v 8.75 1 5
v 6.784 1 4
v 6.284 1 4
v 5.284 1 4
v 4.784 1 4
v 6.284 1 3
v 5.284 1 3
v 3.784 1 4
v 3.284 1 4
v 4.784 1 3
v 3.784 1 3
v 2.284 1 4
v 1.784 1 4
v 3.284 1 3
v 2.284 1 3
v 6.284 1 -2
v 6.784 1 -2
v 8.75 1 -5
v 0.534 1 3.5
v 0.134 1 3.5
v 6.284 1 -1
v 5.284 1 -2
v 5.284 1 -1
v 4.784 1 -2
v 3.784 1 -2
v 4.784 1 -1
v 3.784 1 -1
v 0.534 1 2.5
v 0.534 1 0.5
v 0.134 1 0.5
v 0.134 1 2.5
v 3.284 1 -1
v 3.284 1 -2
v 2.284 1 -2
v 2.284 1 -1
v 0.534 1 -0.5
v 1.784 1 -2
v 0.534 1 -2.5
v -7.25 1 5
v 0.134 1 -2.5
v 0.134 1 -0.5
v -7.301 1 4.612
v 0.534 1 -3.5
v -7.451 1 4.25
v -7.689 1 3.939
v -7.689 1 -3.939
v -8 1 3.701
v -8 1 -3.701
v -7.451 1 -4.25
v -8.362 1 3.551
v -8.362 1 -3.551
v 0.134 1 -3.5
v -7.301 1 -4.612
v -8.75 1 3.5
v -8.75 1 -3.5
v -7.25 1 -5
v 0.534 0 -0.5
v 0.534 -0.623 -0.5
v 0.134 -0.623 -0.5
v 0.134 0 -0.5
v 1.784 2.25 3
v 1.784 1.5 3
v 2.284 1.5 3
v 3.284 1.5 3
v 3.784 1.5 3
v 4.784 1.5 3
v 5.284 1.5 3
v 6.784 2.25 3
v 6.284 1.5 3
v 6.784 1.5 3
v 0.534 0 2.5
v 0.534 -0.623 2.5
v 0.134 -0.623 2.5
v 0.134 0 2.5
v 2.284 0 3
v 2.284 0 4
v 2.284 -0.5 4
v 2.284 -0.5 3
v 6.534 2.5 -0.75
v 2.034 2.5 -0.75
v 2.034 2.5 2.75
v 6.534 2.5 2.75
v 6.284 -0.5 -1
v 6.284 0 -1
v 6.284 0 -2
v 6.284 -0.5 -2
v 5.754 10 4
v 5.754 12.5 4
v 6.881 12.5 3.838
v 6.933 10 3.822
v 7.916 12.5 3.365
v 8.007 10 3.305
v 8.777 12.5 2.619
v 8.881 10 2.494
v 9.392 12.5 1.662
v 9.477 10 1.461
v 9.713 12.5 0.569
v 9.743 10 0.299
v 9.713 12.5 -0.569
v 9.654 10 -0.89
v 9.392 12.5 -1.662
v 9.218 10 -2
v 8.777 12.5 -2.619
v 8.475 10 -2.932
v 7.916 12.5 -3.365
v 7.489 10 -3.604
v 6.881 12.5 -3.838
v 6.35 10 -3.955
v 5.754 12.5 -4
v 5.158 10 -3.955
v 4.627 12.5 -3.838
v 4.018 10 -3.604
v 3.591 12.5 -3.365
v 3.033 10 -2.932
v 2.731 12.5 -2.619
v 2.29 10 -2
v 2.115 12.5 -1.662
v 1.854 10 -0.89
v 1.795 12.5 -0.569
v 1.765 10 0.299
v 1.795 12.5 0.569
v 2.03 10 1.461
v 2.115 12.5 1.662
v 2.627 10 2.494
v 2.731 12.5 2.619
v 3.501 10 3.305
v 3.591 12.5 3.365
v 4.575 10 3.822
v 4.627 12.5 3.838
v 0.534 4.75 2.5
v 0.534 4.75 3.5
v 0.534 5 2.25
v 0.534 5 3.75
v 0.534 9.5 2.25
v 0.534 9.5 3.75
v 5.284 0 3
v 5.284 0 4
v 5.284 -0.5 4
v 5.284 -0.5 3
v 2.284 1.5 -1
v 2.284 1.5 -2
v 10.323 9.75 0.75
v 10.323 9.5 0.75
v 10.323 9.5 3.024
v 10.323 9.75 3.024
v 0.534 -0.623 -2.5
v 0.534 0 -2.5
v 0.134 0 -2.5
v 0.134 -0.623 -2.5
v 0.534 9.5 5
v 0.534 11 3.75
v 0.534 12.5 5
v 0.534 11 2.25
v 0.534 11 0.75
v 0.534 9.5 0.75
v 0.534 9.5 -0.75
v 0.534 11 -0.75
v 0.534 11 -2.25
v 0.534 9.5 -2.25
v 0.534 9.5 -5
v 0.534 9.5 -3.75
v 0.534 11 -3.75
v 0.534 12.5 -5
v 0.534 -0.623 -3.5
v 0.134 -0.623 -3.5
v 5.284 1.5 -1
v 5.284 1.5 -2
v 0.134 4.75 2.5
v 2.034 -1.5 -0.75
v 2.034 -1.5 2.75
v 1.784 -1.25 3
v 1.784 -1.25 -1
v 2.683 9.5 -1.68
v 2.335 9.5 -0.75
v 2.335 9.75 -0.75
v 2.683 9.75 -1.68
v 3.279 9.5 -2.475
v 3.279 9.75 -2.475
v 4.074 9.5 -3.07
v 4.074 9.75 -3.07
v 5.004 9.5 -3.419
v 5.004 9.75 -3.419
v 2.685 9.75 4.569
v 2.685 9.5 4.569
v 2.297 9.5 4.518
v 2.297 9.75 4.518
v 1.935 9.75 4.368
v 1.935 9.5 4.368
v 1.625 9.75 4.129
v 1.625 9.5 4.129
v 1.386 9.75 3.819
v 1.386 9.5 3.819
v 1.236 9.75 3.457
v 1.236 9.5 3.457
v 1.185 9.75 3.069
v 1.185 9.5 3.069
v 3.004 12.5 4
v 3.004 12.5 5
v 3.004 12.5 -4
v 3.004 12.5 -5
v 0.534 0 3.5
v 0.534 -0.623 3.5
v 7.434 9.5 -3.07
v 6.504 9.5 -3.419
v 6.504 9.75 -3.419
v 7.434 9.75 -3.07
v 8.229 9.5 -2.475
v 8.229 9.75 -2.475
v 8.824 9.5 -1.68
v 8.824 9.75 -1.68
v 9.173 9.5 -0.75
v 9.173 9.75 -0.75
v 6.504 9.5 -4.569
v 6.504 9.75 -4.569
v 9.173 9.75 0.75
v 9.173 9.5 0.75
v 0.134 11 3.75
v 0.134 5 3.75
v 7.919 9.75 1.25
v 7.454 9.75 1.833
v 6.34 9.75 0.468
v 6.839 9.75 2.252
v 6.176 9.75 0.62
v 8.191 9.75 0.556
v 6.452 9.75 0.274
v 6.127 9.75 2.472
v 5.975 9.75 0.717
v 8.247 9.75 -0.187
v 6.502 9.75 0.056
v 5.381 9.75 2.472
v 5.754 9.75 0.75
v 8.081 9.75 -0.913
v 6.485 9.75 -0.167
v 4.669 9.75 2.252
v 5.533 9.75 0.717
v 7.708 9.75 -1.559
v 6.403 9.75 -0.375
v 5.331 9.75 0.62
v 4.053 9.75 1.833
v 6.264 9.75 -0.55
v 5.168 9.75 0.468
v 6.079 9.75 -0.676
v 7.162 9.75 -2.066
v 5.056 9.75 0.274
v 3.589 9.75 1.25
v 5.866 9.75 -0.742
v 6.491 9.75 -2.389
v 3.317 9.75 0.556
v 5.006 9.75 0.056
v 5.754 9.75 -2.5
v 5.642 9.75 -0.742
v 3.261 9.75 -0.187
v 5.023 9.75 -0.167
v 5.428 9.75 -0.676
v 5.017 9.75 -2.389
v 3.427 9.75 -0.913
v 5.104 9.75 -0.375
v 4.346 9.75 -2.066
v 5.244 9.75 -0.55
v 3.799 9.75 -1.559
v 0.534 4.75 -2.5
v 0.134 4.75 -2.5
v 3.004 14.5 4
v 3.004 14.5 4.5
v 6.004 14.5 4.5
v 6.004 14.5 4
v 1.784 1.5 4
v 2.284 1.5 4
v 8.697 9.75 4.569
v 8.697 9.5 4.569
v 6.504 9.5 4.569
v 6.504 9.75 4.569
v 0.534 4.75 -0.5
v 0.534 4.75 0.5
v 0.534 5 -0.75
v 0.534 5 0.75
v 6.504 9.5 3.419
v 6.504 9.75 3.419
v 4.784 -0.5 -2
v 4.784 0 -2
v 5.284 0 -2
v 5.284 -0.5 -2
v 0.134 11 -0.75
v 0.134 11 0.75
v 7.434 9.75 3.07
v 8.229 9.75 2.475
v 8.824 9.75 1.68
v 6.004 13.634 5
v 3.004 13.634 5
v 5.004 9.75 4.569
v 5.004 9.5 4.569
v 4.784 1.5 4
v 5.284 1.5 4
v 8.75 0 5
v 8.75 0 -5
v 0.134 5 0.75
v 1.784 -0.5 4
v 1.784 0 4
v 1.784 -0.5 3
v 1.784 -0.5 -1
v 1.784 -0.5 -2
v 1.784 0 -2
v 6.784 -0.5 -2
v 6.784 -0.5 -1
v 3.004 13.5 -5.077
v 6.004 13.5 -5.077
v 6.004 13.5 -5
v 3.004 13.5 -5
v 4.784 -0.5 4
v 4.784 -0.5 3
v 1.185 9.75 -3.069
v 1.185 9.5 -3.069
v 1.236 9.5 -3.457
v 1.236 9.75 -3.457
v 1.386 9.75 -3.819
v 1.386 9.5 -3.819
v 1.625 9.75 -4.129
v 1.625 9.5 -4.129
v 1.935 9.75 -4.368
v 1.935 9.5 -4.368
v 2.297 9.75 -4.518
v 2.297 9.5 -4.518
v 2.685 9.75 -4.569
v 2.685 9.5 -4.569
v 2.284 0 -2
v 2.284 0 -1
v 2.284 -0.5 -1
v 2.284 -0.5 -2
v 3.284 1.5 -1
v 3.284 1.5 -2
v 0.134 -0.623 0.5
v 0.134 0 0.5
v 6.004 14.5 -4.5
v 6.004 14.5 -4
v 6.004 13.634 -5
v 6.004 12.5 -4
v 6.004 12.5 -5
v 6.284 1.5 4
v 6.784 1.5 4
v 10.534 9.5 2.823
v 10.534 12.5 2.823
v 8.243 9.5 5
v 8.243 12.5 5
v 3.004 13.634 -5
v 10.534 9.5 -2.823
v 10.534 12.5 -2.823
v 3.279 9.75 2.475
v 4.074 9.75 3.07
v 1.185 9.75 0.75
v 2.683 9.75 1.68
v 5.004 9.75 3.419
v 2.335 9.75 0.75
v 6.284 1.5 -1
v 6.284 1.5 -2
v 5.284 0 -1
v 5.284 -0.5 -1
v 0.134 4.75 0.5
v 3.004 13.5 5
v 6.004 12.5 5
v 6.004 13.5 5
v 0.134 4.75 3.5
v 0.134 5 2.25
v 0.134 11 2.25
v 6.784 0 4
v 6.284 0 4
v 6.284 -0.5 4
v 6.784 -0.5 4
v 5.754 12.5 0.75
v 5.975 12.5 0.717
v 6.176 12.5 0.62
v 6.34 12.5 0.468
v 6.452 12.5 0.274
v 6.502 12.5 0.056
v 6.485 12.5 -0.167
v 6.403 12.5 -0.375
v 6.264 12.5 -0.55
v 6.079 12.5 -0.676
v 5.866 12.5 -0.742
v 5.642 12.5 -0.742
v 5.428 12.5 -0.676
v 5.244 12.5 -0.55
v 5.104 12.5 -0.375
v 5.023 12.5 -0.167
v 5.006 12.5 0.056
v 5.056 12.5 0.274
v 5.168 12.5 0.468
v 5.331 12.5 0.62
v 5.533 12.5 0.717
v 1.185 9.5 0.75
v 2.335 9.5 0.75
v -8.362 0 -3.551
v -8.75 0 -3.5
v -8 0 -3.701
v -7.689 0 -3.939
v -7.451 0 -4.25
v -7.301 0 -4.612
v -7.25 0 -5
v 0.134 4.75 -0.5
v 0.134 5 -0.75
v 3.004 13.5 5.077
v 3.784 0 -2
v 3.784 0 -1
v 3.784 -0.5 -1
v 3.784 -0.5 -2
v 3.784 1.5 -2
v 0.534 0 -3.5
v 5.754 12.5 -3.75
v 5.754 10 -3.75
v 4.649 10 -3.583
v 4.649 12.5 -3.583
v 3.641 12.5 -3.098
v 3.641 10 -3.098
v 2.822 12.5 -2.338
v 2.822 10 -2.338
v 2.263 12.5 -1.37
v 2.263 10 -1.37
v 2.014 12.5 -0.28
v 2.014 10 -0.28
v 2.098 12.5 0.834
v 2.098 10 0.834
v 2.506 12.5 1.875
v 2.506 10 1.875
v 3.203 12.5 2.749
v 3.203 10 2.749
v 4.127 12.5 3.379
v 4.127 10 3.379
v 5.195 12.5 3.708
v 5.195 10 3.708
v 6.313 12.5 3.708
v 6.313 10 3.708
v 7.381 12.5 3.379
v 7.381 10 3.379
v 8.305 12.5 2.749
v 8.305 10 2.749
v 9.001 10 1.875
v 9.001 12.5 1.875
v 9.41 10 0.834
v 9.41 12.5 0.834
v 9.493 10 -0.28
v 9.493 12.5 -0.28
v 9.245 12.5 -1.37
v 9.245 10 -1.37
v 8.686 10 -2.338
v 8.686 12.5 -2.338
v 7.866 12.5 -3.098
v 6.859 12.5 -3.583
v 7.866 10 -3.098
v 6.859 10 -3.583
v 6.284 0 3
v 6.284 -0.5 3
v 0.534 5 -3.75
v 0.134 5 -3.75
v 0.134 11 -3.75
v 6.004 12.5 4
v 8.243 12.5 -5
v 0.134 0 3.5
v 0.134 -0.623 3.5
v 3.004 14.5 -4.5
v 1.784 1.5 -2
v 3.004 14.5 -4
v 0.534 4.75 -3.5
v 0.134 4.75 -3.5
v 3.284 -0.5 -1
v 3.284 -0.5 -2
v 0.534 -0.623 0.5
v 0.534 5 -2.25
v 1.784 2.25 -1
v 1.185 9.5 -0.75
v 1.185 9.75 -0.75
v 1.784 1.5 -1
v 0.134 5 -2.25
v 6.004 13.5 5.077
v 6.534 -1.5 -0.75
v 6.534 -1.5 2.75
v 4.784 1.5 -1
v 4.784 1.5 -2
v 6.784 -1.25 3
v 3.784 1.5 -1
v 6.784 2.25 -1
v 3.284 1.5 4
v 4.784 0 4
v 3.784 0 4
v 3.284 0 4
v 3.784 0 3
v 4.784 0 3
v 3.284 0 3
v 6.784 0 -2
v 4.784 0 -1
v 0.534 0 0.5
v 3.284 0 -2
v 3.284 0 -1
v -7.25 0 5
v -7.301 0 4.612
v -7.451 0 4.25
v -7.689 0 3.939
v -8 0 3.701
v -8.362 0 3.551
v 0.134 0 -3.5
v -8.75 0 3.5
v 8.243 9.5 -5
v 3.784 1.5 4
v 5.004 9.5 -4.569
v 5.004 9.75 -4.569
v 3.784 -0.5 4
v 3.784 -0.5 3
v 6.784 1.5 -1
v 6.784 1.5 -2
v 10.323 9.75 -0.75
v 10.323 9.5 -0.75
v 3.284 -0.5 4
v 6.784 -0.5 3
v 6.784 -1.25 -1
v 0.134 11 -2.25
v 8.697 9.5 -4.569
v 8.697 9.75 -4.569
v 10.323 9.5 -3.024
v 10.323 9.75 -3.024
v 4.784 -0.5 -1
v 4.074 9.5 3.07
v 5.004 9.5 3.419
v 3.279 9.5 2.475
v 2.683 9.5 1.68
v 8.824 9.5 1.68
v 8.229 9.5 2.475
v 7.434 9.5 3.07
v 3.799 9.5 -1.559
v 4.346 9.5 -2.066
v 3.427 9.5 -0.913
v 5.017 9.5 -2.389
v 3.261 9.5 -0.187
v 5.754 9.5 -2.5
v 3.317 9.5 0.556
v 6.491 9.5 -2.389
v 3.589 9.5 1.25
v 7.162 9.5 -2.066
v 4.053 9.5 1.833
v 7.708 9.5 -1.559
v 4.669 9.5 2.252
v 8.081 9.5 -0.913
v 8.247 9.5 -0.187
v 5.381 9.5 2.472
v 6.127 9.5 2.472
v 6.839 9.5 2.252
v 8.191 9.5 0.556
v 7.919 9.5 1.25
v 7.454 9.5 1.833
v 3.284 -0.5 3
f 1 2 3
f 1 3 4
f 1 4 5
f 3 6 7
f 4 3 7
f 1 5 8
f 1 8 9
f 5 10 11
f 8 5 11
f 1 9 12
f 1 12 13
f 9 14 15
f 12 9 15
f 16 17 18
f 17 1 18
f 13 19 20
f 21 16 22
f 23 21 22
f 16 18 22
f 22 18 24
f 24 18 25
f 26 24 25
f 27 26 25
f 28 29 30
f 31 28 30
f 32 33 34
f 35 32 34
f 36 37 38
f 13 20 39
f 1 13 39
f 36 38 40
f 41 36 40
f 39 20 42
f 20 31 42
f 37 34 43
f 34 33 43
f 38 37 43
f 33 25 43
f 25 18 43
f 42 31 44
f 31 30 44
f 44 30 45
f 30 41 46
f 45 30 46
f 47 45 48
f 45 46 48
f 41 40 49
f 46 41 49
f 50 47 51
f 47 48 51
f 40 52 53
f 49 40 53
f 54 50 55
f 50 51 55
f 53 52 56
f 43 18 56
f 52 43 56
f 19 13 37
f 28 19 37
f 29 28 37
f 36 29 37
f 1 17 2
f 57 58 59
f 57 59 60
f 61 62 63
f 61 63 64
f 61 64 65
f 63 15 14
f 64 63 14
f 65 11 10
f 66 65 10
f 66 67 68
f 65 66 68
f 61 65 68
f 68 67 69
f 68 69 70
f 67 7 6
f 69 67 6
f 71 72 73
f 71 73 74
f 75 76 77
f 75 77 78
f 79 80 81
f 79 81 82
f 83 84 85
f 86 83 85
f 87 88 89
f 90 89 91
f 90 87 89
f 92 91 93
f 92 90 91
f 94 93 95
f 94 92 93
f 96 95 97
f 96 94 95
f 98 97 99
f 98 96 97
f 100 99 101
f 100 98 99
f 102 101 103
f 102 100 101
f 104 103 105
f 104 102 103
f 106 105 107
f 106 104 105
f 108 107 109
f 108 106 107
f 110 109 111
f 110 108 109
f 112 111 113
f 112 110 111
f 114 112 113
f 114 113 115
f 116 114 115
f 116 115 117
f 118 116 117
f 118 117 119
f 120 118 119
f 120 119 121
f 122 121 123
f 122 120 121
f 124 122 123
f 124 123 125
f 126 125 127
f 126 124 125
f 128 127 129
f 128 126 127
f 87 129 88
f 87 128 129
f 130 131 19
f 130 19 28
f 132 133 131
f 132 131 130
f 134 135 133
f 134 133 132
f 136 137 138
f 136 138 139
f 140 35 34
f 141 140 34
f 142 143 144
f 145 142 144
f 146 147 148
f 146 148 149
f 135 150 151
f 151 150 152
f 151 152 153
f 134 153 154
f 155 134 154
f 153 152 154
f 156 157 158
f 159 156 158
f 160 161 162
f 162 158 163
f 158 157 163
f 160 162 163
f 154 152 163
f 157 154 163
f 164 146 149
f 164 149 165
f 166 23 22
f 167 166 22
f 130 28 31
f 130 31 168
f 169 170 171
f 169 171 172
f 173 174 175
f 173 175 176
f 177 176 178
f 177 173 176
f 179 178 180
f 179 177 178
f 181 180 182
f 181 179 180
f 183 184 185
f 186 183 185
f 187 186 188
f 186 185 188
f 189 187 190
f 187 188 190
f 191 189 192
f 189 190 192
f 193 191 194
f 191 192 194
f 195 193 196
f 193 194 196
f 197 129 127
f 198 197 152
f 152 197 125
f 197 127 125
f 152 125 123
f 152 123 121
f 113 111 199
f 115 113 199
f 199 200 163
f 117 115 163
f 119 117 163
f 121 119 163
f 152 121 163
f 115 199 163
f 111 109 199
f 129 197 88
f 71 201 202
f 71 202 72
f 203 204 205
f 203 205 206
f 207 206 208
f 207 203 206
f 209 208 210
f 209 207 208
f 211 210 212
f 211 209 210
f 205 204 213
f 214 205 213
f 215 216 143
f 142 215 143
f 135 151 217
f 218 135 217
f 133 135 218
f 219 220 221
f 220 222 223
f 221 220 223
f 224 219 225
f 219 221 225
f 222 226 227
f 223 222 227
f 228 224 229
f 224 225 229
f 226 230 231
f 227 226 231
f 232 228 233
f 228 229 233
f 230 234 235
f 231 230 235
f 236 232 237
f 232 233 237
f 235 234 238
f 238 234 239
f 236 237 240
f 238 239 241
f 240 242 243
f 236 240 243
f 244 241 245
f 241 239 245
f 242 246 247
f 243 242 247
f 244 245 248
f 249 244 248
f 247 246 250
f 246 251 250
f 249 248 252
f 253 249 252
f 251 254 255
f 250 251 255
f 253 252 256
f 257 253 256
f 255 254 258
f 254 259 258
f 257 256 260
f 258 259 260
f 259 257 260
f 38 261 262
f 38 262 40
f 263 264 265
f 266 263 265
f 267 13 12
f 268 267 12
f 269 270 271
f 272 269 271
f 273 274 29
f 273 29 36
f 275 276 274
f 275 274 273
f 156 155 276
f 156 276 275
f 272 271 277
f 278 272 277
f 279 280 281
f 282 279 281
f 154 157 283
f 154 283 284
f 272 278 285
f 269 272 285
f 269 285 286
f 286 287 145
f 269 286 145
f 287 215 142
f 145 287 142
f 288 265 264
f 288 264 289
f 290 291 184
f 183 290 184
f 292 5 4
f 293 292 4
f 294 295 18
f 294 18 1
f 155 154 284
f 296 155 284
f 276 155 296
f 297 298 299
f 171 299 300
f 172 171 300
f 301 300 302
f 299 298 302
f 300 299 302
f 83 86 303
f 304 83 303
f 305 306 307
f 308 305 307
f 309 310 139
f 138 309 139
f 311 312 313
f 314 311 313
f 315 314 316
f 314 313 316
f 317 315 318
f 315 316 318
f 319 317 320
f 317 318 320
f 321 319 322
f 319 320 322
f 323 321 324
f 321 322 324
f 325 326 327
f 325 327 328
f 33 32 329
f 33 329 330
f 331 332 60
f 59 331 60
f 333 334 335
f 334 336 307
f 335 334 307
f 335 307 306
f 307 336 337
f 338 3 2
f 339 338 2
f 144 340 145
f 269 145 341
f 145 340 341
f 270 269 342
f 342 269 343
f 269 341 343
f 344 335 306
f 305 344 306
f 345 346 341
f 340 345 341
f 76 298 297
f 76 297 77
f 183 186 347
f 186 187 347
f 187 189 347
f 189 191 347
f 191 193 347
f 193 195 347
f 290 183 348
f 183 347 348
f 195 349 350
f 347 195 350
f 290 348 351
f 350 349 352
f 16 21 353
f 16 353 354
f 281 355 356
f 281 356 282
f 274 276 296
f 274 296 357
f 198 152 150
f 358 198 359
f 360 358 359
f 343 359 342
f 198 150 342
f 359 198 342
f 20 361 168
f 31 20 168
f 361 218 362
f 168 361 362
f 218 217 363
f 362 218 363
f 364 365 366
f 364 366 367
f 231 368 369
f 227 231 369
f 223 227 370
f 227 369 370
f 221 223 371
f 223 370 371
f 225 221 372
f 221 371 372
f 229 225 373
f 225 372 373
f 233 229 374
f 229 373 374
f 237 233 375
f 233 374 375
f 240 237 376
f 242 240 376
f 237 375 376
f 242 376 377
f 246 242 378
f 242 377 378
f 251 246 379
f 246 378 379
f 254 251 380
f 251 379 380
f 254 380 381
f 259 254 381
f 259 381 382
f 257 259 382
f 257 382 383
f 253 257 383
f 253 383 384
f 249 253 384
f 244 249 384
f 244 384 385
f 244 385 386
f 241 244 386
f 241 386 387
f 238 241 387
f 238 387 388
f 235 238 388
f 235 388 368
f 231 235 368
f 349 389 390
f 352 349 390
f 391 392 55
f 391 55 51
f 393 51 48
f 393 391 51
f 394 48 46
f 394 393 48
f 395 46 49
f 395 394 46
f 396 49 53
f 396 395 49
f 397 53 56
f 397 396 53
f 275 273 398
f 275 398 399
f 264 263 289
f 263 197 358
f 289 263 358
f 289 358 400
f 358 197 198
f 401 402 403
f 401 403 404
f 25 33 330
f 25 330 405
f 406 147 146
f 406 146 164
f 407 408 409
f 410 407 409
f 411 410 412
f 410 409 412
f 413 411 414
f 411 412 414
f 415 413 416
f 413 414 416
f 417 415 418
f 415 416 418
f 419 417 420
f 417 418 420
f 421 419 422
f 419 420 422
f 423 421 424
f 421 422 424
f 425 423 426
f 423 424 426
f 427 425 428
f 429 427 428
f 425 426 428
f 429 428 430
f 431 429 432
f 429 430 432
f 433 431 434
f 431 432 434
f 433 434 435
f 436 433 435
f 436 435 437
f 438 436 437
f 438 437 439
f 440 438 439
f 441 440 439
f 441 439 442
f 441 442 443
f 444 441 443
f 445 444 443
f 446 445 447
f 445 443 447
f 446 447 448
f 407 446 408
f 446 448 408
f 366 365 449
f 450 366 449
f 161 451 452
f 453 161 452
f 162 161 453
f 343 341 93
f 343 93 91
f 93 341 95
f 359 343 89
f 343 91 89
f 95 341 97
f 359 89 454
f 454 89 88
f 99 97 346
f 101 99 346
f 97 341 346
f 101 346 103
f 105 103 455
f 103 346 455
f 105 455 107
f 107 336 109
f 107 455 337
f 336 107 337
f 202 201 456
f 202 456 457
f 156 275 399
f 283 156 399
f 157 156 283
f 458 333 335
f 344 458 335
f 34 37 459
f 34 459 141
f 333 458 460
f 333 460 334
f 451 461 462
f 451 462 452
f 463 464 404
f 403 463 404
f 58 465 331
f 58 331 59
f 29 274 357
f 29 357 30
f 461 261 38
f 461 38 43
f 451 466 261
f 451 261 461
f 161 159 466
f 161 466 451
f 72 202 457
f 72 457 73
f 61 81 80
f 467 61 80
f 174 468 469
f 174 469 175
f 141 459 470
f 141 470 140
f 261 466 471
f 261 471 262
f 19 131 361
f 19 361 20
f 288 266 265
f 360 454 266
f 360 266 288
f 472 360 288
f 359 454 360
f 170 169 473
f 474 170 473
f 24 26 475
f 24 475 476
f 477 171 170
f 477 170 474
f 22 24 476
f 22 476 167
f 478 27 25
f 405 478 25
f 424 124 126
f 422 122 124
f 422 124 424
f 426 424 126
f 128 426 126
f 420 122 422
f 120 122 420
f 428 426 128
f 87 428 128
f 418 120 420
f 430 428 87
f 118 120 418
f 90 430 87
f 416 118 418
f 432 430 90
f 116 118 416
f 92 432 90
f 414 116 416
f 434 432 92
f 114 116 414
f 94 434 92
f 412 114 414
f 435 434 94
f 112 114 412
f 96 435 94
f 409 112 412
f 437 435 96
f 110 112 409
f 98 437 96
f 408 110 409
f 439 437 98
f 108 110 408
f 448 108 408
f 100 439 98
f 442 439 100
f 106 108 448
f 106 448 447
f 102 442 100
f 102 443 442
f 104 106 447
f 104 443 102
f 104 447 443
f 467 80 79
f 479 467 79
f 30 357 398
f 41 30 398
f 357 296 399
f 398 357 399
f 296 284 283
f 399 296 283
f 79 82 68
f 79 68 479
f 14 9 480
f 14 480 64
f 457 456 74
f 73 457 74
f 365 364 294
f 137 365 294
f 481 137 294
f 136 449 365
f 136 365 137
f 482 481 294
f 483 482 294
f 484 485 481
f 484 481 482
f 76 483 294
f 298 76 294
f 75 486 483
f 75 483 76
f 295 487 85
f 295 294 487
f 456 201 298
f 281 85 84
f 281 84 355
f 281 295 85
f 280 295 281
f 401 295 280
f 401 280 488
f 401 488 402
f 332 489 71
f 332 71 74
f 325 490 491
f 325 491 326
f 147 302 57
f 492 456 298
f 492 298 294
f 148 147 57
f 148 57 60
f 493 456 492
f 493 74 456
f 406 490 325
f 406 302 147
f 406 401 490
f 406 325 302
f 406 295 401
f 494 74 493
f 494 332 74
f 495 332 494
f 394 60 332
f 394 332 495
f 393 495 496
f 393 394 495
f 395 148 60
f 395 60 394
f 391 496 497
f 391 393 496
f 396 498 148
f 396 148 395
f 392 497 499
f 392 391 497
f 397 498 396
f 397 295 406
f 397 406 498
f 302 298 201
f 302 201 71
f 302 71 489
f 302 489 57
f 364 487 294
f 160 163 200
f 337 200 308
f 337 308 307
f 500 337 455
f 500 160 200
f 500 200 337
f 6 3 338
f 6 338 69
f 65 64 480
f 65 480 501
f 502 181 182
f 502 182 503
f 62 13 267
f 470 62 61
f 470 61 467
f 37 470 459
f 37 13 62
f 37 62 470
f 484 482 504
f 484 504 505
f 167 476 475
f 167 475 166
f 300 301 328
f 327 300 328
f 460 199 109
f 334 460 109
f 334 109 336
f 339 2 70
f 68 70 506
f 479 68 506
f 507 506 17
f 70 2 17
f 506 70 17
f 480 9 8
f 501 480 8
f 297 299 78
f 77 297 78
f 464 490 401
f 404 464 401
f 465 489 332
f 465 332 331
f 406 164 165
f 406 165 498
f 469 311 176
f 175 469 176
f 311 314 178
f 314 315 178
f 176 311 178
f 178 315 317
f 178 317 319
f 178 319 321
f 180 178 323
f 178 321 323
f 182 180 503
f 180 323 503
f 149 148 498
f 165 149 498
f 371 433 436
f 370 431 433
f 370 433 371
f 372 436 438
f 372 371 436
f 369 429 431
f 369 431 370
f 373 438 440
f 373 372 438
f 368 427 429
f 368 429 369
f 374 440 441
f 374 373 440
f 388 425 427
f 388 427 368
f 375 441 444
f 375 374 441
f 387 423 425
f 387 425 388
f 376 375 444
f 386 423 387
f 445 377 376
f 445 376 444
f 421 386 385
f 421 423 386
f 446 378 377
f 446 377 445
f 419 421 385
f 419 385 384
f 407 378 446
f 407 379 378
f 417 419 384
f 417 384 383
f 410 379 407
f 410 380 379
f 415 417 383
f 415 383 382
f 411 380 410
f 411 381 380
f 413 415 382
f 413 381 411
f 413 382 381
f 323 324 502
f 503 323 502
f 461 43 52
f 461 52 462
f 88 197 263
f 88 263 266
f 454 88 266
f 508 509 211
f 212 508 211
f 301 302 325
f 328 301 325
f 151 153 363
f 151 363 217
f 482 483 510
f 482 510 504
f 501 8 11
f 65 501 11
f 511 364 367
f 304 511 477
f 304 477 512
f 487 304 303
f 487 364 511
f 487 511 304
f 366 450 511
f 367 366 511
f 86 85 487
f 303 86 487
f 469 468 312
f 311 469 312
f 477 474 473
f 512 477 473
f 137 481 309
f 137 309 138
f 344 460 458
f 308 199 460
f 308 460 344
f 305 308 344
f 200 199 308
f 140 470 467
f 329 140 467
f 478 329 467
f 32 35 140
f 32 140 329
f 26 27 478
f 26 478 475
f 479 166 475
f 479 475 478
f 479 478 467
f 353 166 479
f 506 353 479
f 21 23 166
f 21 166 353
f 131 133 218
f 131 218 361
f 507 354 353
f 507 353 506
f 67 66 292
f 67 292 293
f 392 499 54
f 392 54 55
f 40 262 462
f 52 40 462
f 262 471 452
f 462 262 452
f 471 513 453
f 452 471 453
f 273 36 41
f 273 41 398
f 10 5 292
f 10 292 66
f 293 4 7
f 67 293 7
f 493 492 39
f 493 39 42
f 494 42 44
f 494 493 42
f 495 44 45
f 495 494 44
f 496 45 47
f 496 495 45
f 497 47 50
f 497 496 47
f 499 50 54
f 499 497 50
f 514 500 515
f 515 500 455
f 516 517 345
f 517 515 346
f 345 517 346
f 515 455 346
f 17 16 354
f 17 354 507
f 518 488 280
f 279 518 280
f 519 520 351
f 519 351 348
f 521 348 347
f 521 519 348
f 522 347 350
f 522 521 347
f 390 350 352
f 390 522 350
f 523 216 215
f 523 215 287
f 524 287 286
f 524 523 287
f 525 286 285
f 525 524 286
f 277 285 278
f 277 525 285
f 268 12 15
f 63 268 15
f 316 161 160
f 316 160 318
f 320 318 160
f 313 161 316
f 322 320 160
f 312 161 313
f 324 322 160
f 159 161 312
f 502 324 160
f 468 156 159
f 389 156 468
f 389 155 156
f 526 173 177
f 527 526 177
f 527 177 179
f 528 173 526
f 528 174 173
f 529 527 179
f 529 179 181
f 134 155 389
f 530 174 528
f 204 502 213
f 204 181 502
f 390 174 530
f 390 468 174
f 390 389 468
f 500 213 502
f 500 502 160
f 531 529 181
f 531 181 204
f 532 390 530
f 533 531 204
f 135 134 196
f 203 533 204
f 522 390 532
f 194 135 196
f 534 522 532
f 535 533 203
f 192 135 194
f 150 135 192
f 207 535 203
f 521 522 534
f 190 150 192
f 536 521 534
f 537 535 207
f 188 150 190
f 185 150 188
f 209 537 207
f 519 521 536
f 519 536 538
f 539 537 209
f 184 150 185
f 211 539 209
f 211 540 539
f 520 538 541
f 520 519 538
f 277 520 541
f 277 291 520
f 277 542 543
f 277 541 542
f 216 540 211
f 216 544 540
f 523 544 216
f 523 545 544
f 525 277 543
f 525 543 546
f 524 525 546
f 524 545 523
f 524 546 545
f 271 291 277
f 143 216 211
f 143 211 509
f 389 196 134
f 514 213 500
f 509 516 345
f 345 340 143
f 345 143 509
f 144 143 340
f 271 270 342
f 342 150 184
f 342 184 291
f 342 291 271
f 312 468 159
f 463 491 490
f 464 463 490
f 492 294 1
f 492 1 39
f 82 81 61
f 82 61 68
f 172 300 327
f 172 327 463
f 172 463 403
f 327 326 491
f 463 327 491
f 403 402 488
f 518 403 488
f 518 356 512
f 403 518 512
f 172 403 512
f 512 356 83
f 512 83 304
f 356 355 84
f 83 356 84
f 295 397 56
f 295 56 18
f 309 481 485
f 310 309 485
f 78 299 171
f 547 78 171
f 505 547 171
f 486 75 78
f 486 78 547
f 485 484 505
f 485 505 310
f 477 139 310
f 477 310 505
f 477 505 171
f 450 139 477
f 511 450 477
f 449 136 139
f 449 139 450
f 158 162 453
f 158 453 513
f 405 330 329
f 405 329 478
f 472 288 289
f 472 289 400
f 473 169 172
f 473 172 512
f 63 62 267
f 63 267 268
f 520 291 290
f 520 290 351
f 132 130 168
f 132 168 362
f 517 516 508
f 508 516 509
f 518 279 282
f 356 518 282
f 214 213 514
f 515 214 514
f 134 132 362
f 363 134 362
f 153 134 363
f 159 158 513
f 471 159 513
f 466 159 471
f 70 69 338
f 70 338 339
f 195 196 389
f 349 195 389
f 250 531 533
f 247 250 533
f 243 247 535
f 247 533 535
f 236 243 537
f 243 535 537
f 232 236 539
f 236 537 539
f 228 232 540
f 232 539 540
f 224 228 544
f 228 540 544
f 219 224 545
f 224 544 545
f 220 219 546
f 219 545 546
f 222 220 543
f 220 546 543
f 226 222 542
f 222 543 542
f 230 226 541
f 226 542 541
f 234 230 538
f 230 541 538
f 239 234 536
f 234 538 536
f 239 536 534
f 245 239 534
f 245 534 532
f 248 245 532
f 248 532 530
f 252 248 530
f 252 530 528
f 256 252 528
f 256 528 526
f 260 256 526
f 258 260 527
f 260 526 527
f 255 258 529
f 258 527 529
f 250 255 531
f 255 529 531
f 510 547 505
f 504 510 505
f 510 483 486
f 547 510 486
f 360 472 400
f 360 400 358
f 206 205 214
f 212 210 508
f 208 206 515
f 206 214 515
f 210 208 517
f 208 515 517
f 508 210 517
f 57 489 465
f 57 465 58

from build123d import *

# Parameters (mm, degrees)
BOSS_EXTRUDE1_DEPTH      = 1
SKETCH2_W                = 5
SKETCH2_H                = 4
BOSS_EXTRUDE2_DEPTH      = 1.5
CHAMFER1_SIZE            = 0.25
SKETCH4_W                = 0.5
SKETCH4_H                = 1
BOSS_EXTRUDE3_DEPTH      = 0.5
BOSS_EXTRUDE4_DEPTH      = 0.4
CHAMFER1_OF_MIRROR1_SIZE = 0.25
SKETCH6_R                = 4
BOSS_EXTRUDE5_DEPTH      = 1.5
SKETCH7_W                = 3
SKETCH7_H                = 1
BOSS_EXTRUDE6_DEPTH      = 2
BOSS_EXTRUDE7_DEPTH      = 3
CUT_EXTRUDE1_DEPTH       = 3
SKETCH10_R               = 2.5
BOSS_EXTRUDE8_DEPTH      = 0.25
CUT_EXTRUDE2_DEPTH       = 0.25
SKETCH13_R               = 2.5
BOSS_EXTRUDE11_DEPTH     = 0.25
BOSS_EXTRUDE12_START     = -0.25
SKETCH14_R               = 2.5
BOSS_EXTRUDE12_DEPTH     = 0.25
SKETCH15_R               = 3.75
BOSS_EXTRUDE13_DEPTH     = 2.5
SKETCH17_R               = 0.75
CUT_EXTRUDE3_DEPTH       = 3
CUT_EXTRUDE5_DEPTH       = 7


with BuildPart() as part:
    # Sketch1 → Boss-Extrude1 (new body)
    with BuildSketch(Plane(origin=(0, 0, 0), x_dir=(1, 0, 0), z_dir=(0, 1, 0))):
        with BuildLine():
            Line((8.75, -5), (-7.25, -5))
            ThreePointArc((-7.25, -5), (-7.689339828, -3.939339828), (-8.75, -3.5))
            Line((-8.75, -3.5), (-8.75, 3.5))
            ThreePointArc((-8.75, 3.5), (-7.689339828, 3.939339828), (-7.25, 5))
            Line((-7.25, 5), (8.75, 5))
            Line((8.75, 5), (8.75, -5))
        make_face()
    extrude(amount=BOSS_EXTRUDE1_DEPTH)

    # Sketch2 → Boss-Extrude2 (add)
    with BuildSketch(Plane(origin=(0, 1, 0), x_dir=(1, 0, 0), z_dir=(0, 1, 0))):
        with Locations((4.283897802, -1)):
            Rectangle(SKETCH2_W, SKETCH2_H)
    boss_extrude2 = extrude(amount=BOSS_EXTRUDE2_DEPTH)

    # Chamfer1
    chamfer1_edges = [part.edges().sort_by_distance(p)[0] for p in [
        (6.783897802, 2.5, 1),
        (4.283897802, 2.5, -1),
        (1.783897802, 2.5, 1),
        (4.283897802, 2.5, 3),
    ]]
    chamfer(chamfer1_edges, length=CHAMFER1_SIZE)

    # Sketch4 → Boss-Extrude3 (add)
    with BuildSketch(Plane(origin=(0, 1, 0), x_dir=(1, 0, 0), z_dir=(0, 1, 0))):
        with Locations((5.033897802, -3.5)):
            Rectangle(SKETCH4_W, SKETCH4_H)
        with Locations((6.533897802, -3.5)):
            Rectangle(SKETCH4_W, SKETCH4_H)
        with Locations((3.533897802, -3.5)):
            Rectangle(SKETCH4_W, SKETCH4_H)
        with Locations((2.033897802, -3.5)):
            Rectangle(SKETCH4_W, SKETCH4_H)
        with Locations((6.533897802, 1.5)):
            Rectangle(SKETCH4_W, SKETCH4_H)
        with Locations((5.033897802, 1.5)):
            Rectangle(SKETCH4_W, SKETCH4_H)
        with Locations((3.533897802, 1.5)):
            Rectangle(SKETCH4_W, SKETCH4_H)
        with Locations((2.033897802, 1.5)):
            Rectangle(SKETCH4_W, SKETCH4_H)
    boss_extrude3 = extrude(amount=BOSS_EXTRUDE3_DEPTH)

    # Sketch5 → Boss-Extrude4 (add)
    with BuildSketch(Plane.ZY.offset(-0.533897802)):
        Polygon((3.5, -0.622790988), (2.5, -0.622790988), (2.5, 4.75), (2.25, 5), (2.25, 11), (3.75, 11), (3.75, 5), (3.5, 4.75), align=None)
        Polygon((0.5, -0.622790988), (-0.5, -0.622790988), (-0.5, 4.75), (-0.75, 5), (-0.75, 11), (0.75, 11), (0.75, 5), (0.5, 4.75), align=None)
        Polygon((-2.5, -0.622790988), (-3.5, -0.622790988), (-3.5, 4.75), (-3.75, 5), (-3.75, 11), (-2.25, 11), (-2.25, 5), (-2.5, 4.75), align=None)
    extrude(amount=BOSS_EXTRUDE4_DEPTH)

    # Mirror1: Boss-Extrude2, Boss-Extrude3 across plane
    add(boss_extrude2.mirror(Plane.ZX.offset(0.5)))
    add(boss_extrude3.mirror(Plane.ZX.offset(0.5)))

    # Chamfer1 of Mirror1
    chamfer1_of_mirror1_edges = [part.edges().sort_by_distance(p)[0] for p in [
        (6.783897802, -1.5, 1),
        (4.283897802, -1.5, -1),
        (1.783897802, -1.5, 1),
        (4.283897802, -1.5, 3),
    ]]
    chamfer(chamfer1_of_mirror1_edges, length=CHAMFER1_OF_MIRROR1_SIZE)

    # Sketch6 → Boss-Extrude5 (add, symmetric)
    with BuildSketch(Plane(origin=(0, 11, 0), x_dir=(1, 0, 0), z_dir=(0, 1, 0))):
        with BuildLine():
            Line((0.533897802, 5), (8.533897802, 5))
            ThreePointArc((8.533897802, 5), (9.948111365, 4.414213562), (10.533897802, 3))
            Line((10.533897802, 3), (10.533897802, -3))
            ThreePointArc((10.533897802, -3), (9.948111365, -4.414213562), (8.533897802, -5))
            Line((8.533897802, -5), (0.533897802, -5))
            Line((0.533897802, -5), (0.533897802, 5))
        make_face()
        with Locations(Location((5.753897802, 0, 0), (0, 0, 270))):
            Circle(SKETCH6_R, mode=Mode.SUBTRACT)
    extrude(amount=BOSS_EXTRUDE5_DEPTH, both=True)

    # Sketch7 → Boss-Extrude6 (add)
    with BuildSketch(Plane(origin=(0, 12.5, 0), x_dir=(1, 0, 0), z_dir=(0, 1, 0))):
        with Locations((4.503897802, 4.5)):
            Rectangle(SKETCH7_W, SKETCH7_H)
    boss_extrude6 = extrude(amount=BOSS_EXTRUDE6_DEPTH)

    # Sketch8 → Boss-Extrude7 (add)
    with BuildSketch(Plane(origin=(6.003897802, 0, 0), x_dir=(0, 0, -1), z_dir=(1, 0, 0))):
        Polygon((4.5, 14.5), (5.077350269, 13.5), (4.5, 13.5), align=None)
    boss_extrude7 = extrude(amount=-BOSS_EXTRUDE7_DEPTH)

    # Sketch9 → Cut-Extrude1 (cut)
    with BuildSketch(Plane(origin=(6.003897802, 0, 0), x_dir=(0, 0, -1), z_dir=(1, 0, 0))):
        Polygon((4.5, 14.5), (5, 13.633974596), (5, 14.5), align=None)
    cut_extrude1 = extrude(amount=-CUT_EXTRUDE1_DEPTH, mode=Mode.SUBTRACT)

    # Mirror2: Boss-Extrude6, Boss-Extrude7, Cut-Extrude1 across plane
    add(boss_extrude6.mirror(Plane.XY))
    add(boss_extrude7.mirror(Plane.XY))
    add(cut_extrude1.mirror(Plane.XY), mode=Mode.SUBTRACT)

    # Sketch10 → Boss-Extrude8 (add)
    with BuildSketch(Plane.XZ.offset(-9.5)):
        with BuildLine():
            ThreePointArc((5.003897802, -3.929058411), (5.753897802, -4), (6.503897802, -3.929058411))
            Line((6.503897802, -3.929058411), (6.503897802, -3.418698583))
            ThreePointArc((6.503897802, -3.418698583), (8.228771537, -2.474873734), (9.172596385, -0.75))
            Line((9.172596385, -0.75), (9.682956214, -0.75))
            ThreePointArc((9.682956214, -0.75), (9.736122912, -0.376673834), (9.753897802, 0))
            ThreePointArc((9.753897802, 0), (9.736122912, 0.376673834), (9.682956214, 0.75))
            Line((9.682956214, 0.75), (9.172596385, 0.75))
            ThreePointArc((9.172596385, 0.75), (8.228771537, 2.474873734), (6.503897802, 3.418698583))
            Line((6.503897802, 3.418698583), (6.503897802, 3.929058411))
            ThreePointArc((6.503897802, 3.929058411), (5.753897802, 4), (5.003897802, 3.929058411))
            Line((5.003897802, 3.929058411), (5.003897802, 3.418698583))
            ThreePointArc((5.003897802, 3.418698583), (3.279024068, 2.474873734), (2.33519922, 0.75))
            Line((2.33519922, 0.75), (1.824839391, 0.75))
            ThreePointArc((1.824839391, 0.75), (1.753897802, 0), (1.824839391, -0.75))
            Line((1.824839391, -0.75), (2.33519922, -0.75))
            ThreePointArc((2.33519922, -0.75), (3.279024068, -2.474873734), (5.003897802, -3.418698583))
            Line((5.003897802, -3.418698583), (5.003897802, -3.929058411))
        make_face()
        with Locations(Location((5.753897802, 0, 0), (0, 0, 270))):
            Circle(SKETCH10_R, mode=Mode.SUBTRACT)
    extrude(amount=-BOSS_EXTRUDE8_DEPTH)

    # Sketch11 → Cut-Extrude2 (cut)
    with BuildSketch(Plane.XZ.offset(-9.5)):
        with BuildLine():
            Line((9.682956214, 0.75), (10.322596385, 0.75))
            Line((10.322596385, 0.75), (10.322596385, 3.068698583))
            ThreePointArc((10.322596385, 3.068698583), (9.883256557, 4.129358755), (8.822596385, 4.568698583))
            Line((8.822596385, 4.568698583), (6.503897802, 4.568698583))
            Line((6.503897802, 4.568698583), (6.503897802, 3.929058411))
            ThreePointArc((6.503897802, 3.929058411), (8.582324927, 2.828427125), (9.682956214, 0.75))
        make_face()
        with BuildLine():
            Line((10.322596385, -3.068698583), (10.322596385, -0.75))
            Line((10.322596385, -0.75), (9.682956214, -0.75))
            ThreePointArc((9.682956214, -0.75), (8.582324927, -2.828427125), (6.503897802, -3.929058411))
            Line((6.503897802, -3.929058411), (6.503897802, -4.568698583))
            Line((6.503897802, -4.568698583), (8.822596385, -4.568698583))
            ThreePointArc((8.822596385, -4.568698583), (9.883256557, -4.129358755), (10.322596385, -3.068698583))
        make_face()
        with BuildLine():
            Line((2.68519922, -4.568698583), (5.003897802, -4.568698583))
            Line((5.003897802, -4.568698583), (5.003897802, -3.929058411))
            ThreePointArc((5.003897802, -3.929058411), (2.925470678, -2.828427125), (1.824839391, -0.75))
            Line((1.824839391, -0.75), (1.18519922, -0.75))
            Line((1.18519922, -0.75), (1.18519922, -3.068698583))
            ThreePointArc((1.18519922, -3.068698583), (1.624539048, -4.129358755), (2.68519922, -4.568698583))
        make_face()
        with BuildLine():
            Line((1.18519922, 3.068698583), (1.18519922, 0.75))
            Line((1.18519922, 0.75), (1.824839391, 0.75))
            ThreePointArc((1.824839391, 0.75), (2.925470678, 2.828427125), (5.003897802, 3.929058411))
            Line((5.003897802, 3.929058411), (5.003897802, 4.568698583))
            Line((5.003897802, 4.568698583), (2.68519922, 4.568698583))
            ThreePointArc((2.68519922, 4.568698583), (1.624539048, 4.129358755), (1.18519922, 3.068698583))
        make_face()
    extrude(amount=-CUT_EXTRUDE2_DEPTH, mode=Mode.SUBTRACT)

    # Sketch13 → Boss-Extrude11 (add)
    with BuildSketch(Plane(origin=(0, 9.75, 0), x_dir=(1, 0, 0), z_dir=(0, 1, 0))):
        with BuildLine():
            ThreePointArc((5.753897802, -4), (9.753897802, 0), (5.753897802, 4))
            ThreePointArc((5.753897802, 4), (1.753897802, 0), (5.753897802, -4))
        make_face()
        with Locations(Location((5.753897802, 0, 0), (0, 0, 90))):
            Circle(SKETCH13_R, mode=Mode.SUBTRACT)
    extrude(amount=BOSS_EXTRUDE11_DEPTH)

    # Sketch14 → Boss-Extrude12 (add)
    with BuildSketch(Plane(origin=(0, 10, 0), x_dir=(1, 0, 0), z_dir=(0, 1, 0)).offset(BOSS_EXTRUDE12_START)):
        with Locations(Location((5.753897802, 0, 0), (0, 0, 90))):
            Circle(SKETCH14_R)
    extrude(amount=BOSS_EXTRUDE12_DEPTH)

    # Sketch15 → Boss-Extrude13 (add)
    with BuildSketch(Plane(origin=(0, 10, 0), x_dir=(1, 0, 0), z_dir=(0, 1, 0))):
        with Locations(Location((5.753897802, 0, 0), (0, 0, 90))):
            Circle(SKETCH15_R)
    extrude(amount=BOSS_EXTRUDE13_DEPTH)

    # Sketch17 → Cut-Extrude3 (cut)
    with BuildSketch(Plane(origin=(0, 12.5, 0), x_dir=(1, 0, 0), z_dir=(0, 1, 0))):
        with Locations(Location((5.753897802, 0, 0), (0, 0, 270))):
            Circle(SKETCH17_R)
    extrude(amount=-CUT_EXTRUDE3_DEPTH, mode=Mode.SUBTRACT)

    # Sketch19 → Cut-Extrude5 (cut)
    with BuildSketch(Plane(origin=(0, 12.5, 0), x_dir=(1, 0, 0), z_dir=(0, 1, 0))):
        with BuildLine():
            Line((10.533897802, -3), (10.533897802, -2.823055401))
            Line((10.533897802, -2.823055401), (8.242765452, -5))
            Line((8.242765452, -5), (8.533897802, -5))
            ThreePointArc((8.533897802, -5), (9.948111365, -4.414213562), (10.533897802, -3))
        make_face()
        with BuildLine():
            Line((8.533897802, 5), (8.242765452, 5))
            Line((8.242765452, 5), (10.533897802, 2.823055401))
            Line((10.533897802, 2.823055401), (10.533897802, 3))
            ThreePointArc((10.533897802, 3), (9.948111365, 4.414213562), (8.533897802, 5))
        make_face()
    extrude(amount=-CUT_EXTRUDE5_DEPTH, mode=Mode.SUBTRACT)


solid = part.part
